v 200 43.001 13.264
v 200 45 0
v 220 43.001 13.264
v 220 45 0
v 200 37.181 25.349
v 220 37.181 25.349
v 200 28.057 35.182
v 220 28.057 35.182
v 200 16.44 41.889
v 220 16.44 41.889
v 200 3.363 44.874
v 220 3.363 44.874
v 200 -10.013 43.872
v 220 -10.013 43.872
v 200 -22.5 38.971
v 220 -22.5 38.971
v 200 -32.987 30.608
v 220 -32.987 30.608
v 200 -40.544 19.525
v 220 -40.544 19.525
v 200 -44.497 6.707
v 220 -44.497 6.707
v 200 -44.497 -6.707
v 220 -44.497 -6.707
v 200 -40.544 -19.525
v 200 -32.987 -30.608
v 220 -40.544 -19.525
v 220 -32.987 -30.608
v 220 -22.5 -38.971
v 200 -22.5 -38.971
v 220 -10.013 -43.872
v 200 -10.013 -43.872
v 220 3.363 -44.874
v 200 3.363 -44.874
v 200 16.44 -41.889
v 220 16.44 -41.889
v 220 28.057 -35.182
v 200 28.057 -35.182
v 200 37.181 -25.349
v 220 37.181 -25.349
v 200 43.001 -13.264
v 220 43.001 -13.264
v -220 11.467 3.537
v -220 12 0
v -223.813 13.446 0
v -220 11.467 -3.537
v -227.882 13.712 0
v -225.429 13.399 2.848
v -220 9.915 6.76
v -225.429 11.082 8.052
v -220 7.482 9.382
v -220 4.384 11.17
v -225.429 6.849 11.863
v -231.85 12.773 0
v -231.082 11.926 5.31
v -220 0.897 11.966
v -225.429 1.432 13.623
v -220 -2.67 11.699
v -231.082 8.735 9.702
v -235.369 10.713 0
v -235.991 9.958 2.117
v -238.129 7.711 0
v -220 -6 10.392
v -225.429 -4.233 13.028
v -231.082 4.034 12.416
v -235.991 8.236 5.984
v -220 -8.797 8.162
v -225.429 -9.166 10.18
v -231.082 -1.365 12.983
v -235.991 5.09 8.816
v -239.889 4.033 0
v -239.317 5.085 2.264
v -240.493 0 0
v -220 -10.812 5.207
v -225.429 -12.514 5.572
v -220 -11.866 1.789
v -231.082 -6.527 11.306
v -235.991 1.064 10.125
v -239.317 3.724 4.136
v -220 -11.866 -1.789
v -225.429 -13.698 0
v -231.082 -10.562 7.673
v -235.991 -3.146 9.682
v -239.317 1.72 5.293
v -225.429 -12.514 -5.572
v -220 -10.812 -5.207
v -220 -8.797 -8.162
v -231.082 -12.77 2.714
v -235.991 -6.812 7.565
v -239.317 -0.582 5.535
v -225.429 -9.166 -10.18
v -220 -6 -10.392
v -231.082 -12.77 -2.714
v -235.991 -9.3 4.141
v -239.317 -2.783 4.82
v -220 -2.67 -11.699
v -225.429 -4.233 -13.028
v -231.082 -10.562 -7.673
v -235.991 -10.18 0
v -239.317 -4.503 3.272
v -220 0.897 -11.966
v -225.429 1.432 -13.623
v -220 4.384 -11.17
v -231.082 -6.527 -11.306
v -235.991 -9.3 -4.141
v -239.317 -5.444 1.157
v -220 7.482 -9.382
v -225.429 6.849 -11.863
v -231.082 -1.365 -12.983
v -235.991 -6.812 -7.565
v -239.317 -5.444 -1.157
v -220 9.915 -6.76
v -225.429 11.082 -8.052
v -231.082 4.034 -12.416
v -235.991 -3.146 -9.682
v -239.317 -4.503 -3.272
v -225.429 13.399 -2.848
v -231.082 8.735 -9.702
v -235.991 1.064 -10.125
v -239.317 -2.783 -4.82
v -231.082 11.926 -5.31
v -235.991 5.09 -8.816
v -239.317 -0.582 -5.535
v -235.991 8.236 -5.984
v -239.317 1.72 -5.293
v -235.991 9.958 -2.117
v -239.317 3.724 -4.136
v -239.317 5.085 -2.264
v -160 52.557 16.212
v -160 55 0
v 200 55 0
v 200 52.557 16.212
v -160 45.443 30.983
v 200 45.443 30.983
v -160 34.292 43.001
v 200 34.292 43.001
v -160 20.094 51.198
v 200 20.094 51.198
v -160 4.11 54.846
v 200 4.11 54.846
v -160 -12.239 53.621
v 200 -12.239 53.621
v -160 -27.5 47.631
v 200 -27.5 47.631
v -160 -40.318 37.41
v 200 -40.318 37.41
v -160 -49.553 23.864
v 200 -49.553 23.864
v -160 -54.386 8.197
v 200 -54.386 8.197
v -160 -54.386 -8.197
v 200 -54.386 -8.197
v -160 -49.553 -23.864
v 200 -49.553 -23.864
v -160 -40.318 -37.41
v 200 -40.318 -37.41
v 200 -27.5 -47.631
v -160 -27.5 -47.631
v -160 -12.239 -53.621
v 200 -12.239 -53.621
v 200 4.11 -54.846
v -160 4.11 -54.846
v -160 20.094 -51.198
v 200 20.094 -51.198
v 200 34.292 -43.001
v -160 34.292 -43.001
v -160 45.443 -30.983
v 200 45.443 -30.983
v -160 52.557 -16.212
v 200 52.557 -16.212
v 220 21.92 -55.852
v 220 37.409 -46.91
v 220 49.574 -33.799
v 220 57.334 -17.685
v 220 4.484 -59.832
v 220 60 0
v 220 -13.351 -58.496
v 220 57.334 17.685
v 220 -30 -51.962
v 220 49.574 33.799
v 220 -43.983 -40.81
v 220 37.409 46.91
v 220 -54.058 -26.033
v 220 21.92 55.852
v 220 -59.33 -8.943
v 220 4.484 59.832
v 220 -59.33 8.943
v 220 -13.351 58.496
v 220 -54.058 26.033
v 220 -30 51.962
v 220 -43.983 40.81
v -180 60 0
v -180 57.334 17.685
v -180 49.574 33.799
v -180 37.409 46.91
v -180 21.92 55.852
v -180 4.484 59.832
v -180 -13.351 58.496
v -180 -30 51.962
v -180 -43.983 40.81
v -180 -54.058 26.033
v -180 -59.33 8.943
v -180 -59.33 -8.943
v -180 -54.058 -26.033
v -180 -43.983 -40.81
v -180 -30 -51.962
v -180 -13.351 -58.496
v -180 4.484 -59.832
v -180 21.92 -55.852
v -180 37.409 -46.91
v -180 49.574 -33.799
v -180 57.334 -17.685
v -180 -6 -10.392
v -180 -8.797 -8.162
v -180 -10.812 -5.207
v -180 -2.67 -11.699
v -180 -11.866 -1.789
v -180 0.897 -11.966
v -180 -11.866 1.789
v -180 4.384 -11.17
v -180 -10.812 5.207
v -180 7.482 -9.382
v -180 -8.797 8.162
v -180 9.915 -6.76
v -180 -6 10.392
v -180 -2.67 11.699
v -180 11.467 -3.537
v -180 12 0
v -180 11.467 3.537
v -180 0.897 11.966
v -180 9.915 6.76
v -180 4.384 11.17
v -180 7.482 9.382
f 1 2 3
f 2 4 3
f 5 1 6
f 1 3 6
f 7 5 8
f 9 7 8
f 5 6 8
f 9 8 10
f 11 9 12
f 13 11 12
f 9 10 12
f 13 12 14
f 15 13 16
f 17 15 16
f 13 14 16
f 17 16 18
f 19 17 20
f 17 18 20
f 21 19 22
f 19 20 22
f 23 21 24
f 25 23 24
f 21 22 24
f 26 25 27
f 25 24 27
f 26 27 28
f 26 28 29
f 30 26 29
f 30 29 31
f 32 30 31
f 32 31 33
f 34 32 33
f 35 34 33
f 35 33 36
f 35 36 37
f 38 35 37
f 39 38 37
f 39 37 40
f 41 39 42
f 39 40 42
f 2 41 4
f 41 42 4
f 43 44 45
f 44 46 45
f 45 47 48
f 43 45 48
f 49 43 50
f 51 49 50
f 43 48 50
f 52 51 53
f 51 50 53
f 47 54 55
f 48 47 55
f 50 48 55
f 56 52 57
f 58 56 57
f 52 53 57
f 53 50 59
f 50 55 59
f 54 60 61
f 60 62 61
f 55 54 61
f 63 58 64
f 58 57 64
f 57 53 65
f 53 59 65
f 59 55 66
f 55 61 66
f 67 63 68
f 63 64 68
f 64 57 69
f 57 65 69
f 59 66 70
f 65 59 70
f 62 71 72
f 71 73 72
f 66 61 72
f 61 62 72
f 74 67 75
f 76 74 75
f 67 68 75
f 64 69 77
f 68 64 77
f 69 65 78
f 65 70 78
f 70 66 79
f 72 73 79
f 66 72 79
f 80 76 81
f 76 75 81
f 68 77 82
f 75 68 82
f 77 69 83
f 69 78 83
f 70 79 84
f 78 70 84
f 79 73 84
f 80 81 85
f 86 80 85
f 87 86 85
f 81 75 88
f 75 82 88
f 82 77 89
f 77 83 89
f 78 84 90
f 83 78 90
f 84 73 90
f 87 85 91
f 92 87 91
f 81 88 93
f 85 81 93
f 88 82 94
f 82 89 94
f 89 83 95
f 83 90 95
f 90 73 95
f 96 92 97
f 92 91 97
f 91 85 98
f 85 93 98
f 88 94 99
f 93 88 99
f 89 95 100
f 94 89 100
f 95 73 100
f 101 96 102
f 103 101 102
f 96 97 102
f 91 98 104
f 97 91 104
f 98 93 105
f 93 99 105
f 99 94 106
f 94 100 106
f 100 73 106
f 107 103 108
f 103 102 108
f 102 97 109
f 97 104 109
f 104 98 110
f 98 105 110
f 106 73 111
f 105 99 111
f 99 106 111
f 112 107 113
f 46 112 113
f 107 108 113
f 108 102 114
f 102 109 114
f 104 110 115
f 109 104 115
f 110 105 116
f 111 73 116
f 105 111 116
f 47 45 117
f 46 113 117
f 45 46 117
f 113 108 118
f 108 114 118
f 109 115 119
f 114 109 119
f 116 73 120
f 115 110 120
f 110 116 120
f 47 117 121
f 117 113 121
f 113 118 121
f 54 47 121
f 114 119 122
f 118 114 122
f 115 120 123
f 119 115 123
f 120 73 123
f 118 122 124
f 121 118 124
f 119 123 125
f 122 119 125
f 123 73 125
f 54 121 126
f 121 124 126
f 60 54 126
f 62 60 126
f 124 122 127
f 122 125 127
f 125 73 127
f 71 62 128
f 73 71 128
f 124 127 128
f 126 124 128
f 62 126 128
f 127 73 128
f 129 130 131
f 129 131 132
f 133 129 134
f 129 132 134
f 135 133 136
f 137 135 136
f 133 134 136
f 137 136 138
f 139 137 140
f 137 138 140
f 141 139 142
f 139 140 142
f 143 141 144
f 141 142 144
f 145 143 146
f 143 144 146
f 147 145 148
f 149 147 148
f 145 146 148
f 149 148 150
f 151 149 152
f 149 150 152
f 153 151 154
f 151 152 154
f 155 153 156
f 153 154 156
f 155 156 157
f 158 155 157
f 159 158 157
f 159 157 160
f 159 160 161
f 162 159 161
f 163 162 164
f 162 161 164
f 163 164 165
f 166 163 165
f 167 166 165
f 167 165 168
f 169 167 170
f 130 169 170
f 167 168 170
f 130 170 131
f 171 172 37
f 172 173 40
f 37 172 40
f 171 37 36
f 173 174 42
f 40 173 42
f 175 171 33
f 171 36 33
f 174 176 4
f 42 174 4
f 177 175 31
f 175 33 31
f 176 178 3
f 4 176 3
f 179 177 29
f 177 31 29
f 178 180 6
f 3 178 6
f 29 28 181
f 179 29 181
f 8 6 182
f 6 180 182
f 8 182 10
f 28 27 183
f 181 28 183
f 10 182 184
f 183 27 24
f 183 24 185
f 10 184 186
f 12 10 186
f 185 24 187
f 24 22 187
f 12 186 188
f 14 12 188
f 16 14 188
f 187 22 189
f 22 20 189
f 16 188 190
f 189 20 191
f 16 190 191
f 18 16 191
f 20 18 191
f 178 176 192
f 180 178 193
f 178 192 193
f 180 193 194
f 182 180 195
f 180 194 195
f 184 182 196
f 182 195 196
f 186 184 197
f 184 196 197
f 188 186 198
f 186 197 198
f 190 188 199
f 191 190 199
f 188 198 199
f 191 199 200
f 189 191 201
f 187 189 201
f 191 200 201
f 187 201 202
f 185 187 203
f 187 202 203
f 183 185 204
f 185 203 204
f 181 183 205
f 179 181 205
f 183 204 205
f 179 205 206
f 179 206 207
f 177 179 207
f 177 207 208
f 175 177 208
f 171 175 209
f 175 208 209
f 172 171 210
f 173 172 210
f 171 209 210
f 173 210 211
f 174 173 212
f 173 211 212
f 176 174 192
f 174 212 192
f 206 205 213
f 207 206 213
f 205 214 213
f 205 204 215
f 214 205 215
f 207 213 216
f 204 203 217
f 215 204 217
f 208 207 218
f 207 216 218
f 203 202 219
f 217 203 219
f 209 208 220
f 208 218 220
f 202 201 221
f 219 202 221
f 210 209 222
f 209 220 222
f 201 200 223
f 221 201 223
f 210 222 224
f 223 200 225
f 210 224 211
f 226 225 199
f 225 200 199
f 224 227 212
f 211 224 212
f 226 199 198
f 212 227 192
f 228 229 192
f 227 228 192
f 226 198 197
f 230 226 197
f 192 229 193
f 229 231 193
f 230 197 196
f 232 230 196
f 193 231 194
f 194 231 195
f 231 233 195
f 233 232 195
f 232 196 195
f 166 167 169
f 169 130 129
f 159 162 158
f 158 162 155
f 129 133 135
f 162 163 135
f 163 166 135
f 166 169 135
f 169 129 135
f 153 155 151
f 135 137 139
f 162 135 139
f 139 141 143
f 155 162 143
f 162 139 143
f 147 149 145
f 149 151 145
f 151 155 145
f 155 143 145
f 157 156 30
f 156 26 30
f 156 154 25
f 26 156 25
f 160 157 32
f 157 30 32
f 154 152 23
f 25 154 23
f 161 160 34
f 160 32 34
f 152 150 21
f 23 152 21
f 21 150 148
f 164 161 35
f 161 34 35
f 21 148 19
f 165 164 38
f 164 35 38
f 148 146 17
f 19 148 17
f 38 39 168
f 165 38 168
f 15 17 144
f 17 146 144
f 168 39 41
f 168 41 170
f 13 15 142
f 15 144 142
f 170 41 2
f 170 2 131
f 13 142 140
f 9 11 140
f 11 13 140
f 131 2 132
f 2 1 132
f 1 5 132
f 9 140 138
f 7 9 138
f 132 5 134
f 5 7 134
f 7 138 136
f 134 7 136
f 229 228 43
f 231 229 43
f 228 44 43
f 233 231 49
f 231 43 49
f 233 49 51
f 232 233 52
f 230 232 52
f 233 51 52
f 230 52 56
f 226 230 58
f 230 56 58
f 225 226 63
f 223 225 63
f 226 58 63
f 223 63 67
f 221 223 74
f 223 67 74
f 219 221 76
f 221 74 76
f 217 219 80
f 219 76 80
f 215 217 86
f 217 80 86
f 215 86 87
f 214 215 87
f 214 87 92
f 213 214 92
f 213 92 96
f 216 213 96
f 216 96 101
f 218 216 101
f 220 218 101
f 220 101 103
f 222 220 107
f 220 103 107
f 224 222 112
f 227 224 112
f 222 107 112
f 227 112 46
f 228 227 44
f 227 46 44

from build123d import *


with BuildPart() as part:
    # Sketch1 → Revolve1 (revolve)
    with BuildSketch(Plane.XY):
        Polygon((220, 45), (220, 60), (-180, 60), (-180, 12), (-220, 12), (-220, 0), (-160, 0), (-160, 55), (200, 55), (200, 45), align=None)
    revolve(axis=Axis((-220, 0, 0), (1, 0, 0)))

    # Sketch2 → Ball (revolve)
    with BuildSketch(Plane.XY):
        with BuildLine():
            Line((-240.493320132, 0), (-212.973320132, 0))
            ThreePointArc((-212.973320132, 0), (-226.733320132, 13.76), (-240.493320132, 0))
        make_face()
    revolve(axis=Axis((-240.493320132, 0, 0), (1, 0, 0)))


solid = part.part
